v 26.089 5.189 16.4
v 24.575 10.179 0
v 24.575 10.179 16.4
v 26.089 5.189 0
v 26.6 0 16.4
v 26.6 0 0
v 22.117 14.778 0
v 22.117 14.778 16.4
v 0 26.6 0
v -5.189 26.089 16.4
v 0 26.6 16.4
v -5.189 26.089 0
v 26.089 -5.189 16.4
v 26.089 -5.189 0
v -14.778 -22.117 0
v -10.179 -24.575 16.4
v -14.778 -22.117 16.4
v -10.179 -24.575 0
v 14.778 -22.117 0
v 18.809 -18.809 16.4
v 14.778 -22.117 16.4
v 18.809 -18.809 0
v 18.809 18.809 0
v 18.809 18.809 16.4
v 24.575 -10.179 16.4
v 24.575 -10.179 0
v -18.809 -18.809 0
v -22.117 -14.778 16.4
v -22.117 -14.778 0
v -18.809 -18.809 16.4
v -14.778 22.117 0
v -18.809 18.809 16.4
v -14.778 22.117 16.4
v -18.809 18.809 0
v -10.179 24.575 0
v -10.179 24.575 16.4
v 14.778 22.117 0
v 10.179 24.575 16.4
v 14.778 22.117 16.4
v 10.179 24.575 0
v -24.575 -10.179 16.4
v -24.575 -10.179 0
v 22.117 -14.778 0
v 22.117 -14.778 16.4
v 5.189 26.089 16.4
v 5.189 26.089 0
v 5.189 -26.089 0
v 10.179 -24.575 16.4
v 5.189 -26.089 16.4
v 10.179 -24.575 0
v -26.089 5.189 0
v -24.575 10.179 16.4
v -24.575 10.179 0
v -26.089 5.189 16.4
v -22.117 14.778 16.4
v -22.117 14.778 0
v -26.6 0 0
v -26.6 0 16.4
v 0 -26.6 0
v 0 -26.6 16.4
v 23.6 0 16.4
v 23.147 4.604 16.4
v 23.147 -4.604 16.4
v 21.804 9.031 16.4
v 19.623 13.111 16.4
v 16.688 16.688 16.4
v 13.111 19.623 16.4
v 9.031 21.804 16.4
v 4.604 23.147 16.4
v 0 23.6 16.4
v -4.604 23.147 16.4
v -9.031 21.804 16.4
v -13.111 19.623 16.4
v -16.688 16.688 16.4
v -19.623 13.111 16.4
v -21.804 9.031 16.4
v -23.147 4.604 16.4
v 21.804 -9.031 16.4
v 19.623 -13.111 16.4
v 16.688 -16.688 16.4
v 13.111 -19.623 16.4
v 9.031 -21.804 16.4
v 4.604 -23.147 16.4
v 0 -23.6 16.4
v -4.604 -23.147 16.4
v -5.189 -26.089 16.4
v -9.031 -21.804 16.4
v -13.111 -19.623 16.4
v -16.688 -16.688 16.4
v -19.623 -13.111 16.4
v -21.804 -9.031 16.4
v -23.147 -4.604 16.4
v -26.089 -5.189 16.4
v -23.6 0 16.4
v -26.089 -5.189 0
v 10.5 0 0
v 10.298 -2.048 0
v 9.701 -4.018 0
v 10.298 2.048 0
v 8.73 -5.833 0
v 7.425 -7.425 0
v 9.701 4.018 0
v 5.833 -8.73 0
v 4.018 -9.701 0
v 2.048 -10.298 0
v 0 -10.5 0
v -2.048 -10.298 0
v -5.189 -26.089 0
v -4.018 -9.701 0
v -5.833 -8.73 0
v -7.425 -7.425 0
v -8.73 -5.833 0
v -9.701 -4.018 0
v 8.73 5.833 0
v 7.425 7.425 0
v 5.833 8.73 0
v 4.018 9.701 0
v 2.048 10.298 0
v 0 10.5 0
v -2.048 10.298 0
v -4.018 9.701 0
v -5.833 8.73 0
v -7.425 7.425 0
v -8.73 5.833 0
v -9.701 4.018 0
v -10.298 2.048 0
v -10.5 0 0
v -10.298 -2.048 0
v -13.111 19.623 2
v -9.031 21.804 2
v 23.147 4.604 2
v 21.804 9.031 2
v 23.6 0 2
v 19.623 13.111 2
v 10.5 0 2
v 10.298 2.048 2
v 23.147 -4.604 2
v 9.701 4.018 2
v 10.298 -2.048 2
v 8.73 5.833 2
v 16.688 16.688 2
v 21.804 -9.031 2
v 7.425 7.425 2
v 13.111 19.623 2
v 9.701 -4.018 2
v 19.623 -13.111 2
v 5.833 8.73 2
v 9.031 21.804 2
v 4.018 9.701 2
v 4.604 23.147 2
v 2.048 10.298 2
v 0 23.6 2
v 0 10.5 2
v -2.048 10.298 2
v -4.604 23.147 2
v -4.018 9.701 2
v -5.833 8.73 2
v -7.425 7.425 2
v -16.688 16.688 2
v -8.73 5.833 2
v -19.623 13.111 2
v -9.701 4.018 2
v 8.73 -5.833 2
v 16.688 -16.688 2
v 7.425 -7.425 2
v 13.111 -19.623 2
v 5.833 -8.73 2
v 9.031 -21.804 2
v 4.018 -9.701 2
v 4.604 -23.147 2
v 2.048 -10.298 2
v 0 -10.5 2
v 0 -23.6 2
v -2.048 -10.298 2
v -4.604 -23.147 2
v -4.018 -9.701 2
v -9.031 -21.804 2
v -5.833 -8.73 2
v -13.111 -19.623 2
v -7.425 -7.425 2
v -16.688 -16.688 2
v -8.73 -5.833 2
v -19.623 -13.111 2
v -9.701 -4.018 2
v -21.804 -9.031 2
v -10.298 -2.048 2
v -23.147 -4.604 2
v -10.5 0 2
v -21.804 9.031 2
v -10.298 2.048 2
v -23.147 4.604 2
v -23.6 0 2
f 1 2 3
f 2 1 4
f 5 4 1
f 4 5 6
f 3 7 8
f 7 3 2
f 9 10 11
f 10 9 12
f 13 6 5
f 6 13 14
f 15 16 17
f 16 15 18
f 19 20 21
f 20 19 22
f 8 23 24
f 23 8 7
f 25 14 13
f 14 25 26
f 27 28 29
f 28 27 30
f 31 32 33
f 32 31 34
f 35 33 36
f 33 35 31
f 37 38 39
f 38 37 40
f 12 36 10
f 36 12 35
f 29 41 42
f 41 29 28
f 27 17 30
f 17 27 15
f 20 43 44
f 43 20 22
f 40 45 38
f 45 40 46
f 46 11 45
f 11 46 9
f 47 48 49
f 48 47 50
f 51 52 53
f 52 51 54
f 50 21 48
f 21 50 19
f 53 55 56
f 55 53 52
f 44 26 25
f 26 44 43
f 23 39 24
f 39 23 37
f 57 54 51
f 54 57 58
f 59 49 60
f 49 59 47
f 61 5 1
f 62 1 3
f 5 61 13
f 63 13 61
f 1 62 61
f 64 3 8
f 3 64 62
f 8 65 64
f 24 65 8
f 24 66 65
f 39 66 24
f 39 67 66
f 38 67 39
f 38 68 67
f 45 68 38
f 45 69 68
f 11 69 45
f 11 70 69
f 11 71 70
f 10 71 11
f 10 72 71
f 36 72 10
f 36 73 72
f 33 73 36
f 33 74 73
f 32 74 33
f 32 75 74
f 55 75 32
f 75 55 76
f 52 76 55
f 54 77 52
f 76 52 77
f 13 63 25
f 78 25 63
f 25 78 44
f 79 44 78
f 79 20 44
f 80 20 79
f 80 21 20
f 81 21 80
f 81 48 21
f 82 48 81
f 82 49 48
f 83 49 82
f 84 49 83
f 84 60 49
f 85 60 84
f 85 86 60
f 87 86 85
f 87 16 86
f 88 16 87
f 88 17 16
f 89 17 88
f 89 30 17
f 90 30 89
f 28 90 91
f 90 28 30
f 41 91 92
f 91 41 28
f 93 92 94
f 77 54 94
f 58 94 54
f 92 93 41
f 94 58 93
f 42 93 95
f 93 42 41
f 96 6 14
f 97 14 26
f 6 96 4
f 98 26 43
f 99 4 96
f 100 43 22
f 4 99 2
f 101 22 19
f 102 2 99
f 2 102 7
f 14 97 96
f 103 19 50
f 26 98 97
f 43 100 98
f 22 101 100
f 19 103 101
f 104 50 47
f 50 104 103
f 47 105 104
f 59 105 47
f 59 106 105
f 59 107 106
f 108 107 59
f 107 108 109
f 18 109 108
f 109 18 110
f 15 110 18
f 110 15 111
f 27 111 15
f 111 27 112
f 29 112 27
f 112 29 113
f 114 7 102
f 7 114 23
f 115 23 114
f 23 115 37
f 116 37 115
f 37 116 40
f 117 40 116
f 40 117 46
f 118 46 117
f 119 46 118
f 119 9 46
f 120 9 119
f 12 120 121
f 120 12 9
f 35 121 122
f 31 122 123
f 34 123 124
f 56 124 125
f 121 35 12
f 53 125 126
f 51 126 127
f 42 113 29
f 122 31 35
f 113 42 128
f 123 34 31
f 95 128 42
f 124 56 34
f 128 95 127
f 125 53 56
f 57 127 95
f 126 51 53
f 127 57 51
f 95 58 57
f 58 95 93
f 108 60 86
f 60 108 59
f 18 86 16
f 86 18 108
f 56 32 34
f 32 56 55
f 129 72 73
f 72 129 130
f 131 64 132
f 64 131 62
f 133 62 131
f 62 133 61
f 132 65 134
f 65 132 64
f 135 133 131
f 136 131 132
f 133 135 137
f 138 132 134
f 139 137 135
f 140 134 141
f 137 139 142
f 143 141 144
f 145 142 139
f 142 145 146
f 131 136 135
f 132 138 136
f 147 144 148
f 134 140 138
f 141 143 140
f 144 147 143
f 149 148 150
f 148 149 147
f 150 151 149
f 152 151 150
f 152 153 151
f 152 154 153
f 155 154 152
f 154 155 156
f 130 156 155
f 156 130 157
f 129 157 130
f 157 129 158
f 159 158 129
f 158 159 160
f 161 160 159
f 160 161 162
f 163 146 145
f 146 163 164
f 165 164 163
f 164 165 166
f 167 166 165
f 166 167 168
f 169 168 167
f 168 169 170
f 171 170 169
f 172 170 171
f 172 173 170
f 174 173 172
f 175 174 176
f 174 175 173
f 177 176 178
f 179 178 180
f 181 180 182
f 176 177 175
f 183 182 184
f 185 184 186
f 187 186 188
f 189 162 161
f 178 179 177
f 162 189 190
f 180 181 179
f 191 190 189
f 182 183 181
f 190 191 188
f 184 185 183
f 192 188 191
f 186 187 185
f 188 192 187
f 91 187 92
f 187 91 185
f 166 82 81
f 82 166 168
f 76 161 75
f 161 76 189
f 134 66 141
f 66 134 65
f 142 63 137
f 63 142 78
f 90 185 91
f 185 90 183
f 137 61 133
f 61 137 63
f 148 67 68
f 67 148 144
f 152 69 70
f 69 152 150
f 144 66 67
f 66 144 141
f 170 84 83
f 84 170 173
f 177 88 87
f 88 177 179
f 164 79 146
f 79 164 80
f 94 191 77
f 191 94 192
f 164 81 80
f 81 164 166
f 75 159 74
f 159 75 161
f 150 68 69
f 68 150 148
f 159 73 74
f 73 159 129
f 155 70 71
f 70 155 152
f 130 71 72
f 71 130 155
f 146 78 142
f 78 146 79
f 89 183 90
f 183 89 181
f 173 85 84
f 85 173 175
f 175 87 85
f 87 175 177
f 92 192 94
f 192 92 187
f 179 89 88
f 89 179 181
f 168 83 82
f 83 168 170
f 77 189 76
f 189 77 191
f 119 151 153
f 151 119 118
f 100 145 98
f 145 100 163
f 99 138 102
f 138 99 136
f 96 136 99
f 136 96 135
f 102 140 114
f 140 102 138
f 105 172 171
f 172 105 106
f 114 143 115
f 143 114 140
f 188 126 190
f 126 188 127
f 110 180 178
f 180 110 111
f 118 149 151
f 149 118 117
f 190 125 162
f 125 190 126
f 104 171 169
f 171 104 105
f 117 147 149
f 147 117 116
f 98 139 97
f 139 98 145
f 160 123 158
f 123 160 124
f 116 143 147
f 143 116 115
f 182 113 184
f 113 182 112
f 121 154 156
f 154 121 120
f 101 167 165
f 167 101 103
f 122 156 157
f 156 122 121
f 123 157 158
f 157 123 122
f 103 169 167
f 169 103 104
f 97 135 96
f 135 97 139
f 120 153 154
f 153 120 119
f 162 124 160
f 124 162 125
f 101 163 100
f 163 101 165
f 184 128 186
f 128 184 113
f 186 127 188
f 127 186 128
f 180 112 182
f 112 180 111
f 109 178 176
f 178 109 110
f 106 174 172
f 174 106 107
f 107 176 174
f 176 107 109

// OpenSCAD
$fn = 32;

// ----------------------------------------------------------------------
// Bearing housing: seat for 6204 (47 x 14 mm), 53.2 mm body
// ----------------------------------------------------------------------

// --- parameters (mm) ---
case_d = 53.2;            // housing outside diameter
case_h = 16.4;            // overall housing height
rim_t = 3;                // wall thickness
bearing_seat = 47.2;      // 6204 seat, 0.2 mm clearance
seat_h = 14.4;            // pocket depth
shoulder = 2;             // shoulder under the bearing
pass_d = 21;              // shaft passage

module body() {
  cylinder(h = case_h, d = case_d);
}

difference() {
  union() {
    body();
  }
  translate([0, 0, case_h - seat_h]) cylinder(h = seat_h + 1, d = bearing_seat);
  translate([0, 0, -1]) cylinder(h = case_h - seat_h + 1, d = pass_d);
}
